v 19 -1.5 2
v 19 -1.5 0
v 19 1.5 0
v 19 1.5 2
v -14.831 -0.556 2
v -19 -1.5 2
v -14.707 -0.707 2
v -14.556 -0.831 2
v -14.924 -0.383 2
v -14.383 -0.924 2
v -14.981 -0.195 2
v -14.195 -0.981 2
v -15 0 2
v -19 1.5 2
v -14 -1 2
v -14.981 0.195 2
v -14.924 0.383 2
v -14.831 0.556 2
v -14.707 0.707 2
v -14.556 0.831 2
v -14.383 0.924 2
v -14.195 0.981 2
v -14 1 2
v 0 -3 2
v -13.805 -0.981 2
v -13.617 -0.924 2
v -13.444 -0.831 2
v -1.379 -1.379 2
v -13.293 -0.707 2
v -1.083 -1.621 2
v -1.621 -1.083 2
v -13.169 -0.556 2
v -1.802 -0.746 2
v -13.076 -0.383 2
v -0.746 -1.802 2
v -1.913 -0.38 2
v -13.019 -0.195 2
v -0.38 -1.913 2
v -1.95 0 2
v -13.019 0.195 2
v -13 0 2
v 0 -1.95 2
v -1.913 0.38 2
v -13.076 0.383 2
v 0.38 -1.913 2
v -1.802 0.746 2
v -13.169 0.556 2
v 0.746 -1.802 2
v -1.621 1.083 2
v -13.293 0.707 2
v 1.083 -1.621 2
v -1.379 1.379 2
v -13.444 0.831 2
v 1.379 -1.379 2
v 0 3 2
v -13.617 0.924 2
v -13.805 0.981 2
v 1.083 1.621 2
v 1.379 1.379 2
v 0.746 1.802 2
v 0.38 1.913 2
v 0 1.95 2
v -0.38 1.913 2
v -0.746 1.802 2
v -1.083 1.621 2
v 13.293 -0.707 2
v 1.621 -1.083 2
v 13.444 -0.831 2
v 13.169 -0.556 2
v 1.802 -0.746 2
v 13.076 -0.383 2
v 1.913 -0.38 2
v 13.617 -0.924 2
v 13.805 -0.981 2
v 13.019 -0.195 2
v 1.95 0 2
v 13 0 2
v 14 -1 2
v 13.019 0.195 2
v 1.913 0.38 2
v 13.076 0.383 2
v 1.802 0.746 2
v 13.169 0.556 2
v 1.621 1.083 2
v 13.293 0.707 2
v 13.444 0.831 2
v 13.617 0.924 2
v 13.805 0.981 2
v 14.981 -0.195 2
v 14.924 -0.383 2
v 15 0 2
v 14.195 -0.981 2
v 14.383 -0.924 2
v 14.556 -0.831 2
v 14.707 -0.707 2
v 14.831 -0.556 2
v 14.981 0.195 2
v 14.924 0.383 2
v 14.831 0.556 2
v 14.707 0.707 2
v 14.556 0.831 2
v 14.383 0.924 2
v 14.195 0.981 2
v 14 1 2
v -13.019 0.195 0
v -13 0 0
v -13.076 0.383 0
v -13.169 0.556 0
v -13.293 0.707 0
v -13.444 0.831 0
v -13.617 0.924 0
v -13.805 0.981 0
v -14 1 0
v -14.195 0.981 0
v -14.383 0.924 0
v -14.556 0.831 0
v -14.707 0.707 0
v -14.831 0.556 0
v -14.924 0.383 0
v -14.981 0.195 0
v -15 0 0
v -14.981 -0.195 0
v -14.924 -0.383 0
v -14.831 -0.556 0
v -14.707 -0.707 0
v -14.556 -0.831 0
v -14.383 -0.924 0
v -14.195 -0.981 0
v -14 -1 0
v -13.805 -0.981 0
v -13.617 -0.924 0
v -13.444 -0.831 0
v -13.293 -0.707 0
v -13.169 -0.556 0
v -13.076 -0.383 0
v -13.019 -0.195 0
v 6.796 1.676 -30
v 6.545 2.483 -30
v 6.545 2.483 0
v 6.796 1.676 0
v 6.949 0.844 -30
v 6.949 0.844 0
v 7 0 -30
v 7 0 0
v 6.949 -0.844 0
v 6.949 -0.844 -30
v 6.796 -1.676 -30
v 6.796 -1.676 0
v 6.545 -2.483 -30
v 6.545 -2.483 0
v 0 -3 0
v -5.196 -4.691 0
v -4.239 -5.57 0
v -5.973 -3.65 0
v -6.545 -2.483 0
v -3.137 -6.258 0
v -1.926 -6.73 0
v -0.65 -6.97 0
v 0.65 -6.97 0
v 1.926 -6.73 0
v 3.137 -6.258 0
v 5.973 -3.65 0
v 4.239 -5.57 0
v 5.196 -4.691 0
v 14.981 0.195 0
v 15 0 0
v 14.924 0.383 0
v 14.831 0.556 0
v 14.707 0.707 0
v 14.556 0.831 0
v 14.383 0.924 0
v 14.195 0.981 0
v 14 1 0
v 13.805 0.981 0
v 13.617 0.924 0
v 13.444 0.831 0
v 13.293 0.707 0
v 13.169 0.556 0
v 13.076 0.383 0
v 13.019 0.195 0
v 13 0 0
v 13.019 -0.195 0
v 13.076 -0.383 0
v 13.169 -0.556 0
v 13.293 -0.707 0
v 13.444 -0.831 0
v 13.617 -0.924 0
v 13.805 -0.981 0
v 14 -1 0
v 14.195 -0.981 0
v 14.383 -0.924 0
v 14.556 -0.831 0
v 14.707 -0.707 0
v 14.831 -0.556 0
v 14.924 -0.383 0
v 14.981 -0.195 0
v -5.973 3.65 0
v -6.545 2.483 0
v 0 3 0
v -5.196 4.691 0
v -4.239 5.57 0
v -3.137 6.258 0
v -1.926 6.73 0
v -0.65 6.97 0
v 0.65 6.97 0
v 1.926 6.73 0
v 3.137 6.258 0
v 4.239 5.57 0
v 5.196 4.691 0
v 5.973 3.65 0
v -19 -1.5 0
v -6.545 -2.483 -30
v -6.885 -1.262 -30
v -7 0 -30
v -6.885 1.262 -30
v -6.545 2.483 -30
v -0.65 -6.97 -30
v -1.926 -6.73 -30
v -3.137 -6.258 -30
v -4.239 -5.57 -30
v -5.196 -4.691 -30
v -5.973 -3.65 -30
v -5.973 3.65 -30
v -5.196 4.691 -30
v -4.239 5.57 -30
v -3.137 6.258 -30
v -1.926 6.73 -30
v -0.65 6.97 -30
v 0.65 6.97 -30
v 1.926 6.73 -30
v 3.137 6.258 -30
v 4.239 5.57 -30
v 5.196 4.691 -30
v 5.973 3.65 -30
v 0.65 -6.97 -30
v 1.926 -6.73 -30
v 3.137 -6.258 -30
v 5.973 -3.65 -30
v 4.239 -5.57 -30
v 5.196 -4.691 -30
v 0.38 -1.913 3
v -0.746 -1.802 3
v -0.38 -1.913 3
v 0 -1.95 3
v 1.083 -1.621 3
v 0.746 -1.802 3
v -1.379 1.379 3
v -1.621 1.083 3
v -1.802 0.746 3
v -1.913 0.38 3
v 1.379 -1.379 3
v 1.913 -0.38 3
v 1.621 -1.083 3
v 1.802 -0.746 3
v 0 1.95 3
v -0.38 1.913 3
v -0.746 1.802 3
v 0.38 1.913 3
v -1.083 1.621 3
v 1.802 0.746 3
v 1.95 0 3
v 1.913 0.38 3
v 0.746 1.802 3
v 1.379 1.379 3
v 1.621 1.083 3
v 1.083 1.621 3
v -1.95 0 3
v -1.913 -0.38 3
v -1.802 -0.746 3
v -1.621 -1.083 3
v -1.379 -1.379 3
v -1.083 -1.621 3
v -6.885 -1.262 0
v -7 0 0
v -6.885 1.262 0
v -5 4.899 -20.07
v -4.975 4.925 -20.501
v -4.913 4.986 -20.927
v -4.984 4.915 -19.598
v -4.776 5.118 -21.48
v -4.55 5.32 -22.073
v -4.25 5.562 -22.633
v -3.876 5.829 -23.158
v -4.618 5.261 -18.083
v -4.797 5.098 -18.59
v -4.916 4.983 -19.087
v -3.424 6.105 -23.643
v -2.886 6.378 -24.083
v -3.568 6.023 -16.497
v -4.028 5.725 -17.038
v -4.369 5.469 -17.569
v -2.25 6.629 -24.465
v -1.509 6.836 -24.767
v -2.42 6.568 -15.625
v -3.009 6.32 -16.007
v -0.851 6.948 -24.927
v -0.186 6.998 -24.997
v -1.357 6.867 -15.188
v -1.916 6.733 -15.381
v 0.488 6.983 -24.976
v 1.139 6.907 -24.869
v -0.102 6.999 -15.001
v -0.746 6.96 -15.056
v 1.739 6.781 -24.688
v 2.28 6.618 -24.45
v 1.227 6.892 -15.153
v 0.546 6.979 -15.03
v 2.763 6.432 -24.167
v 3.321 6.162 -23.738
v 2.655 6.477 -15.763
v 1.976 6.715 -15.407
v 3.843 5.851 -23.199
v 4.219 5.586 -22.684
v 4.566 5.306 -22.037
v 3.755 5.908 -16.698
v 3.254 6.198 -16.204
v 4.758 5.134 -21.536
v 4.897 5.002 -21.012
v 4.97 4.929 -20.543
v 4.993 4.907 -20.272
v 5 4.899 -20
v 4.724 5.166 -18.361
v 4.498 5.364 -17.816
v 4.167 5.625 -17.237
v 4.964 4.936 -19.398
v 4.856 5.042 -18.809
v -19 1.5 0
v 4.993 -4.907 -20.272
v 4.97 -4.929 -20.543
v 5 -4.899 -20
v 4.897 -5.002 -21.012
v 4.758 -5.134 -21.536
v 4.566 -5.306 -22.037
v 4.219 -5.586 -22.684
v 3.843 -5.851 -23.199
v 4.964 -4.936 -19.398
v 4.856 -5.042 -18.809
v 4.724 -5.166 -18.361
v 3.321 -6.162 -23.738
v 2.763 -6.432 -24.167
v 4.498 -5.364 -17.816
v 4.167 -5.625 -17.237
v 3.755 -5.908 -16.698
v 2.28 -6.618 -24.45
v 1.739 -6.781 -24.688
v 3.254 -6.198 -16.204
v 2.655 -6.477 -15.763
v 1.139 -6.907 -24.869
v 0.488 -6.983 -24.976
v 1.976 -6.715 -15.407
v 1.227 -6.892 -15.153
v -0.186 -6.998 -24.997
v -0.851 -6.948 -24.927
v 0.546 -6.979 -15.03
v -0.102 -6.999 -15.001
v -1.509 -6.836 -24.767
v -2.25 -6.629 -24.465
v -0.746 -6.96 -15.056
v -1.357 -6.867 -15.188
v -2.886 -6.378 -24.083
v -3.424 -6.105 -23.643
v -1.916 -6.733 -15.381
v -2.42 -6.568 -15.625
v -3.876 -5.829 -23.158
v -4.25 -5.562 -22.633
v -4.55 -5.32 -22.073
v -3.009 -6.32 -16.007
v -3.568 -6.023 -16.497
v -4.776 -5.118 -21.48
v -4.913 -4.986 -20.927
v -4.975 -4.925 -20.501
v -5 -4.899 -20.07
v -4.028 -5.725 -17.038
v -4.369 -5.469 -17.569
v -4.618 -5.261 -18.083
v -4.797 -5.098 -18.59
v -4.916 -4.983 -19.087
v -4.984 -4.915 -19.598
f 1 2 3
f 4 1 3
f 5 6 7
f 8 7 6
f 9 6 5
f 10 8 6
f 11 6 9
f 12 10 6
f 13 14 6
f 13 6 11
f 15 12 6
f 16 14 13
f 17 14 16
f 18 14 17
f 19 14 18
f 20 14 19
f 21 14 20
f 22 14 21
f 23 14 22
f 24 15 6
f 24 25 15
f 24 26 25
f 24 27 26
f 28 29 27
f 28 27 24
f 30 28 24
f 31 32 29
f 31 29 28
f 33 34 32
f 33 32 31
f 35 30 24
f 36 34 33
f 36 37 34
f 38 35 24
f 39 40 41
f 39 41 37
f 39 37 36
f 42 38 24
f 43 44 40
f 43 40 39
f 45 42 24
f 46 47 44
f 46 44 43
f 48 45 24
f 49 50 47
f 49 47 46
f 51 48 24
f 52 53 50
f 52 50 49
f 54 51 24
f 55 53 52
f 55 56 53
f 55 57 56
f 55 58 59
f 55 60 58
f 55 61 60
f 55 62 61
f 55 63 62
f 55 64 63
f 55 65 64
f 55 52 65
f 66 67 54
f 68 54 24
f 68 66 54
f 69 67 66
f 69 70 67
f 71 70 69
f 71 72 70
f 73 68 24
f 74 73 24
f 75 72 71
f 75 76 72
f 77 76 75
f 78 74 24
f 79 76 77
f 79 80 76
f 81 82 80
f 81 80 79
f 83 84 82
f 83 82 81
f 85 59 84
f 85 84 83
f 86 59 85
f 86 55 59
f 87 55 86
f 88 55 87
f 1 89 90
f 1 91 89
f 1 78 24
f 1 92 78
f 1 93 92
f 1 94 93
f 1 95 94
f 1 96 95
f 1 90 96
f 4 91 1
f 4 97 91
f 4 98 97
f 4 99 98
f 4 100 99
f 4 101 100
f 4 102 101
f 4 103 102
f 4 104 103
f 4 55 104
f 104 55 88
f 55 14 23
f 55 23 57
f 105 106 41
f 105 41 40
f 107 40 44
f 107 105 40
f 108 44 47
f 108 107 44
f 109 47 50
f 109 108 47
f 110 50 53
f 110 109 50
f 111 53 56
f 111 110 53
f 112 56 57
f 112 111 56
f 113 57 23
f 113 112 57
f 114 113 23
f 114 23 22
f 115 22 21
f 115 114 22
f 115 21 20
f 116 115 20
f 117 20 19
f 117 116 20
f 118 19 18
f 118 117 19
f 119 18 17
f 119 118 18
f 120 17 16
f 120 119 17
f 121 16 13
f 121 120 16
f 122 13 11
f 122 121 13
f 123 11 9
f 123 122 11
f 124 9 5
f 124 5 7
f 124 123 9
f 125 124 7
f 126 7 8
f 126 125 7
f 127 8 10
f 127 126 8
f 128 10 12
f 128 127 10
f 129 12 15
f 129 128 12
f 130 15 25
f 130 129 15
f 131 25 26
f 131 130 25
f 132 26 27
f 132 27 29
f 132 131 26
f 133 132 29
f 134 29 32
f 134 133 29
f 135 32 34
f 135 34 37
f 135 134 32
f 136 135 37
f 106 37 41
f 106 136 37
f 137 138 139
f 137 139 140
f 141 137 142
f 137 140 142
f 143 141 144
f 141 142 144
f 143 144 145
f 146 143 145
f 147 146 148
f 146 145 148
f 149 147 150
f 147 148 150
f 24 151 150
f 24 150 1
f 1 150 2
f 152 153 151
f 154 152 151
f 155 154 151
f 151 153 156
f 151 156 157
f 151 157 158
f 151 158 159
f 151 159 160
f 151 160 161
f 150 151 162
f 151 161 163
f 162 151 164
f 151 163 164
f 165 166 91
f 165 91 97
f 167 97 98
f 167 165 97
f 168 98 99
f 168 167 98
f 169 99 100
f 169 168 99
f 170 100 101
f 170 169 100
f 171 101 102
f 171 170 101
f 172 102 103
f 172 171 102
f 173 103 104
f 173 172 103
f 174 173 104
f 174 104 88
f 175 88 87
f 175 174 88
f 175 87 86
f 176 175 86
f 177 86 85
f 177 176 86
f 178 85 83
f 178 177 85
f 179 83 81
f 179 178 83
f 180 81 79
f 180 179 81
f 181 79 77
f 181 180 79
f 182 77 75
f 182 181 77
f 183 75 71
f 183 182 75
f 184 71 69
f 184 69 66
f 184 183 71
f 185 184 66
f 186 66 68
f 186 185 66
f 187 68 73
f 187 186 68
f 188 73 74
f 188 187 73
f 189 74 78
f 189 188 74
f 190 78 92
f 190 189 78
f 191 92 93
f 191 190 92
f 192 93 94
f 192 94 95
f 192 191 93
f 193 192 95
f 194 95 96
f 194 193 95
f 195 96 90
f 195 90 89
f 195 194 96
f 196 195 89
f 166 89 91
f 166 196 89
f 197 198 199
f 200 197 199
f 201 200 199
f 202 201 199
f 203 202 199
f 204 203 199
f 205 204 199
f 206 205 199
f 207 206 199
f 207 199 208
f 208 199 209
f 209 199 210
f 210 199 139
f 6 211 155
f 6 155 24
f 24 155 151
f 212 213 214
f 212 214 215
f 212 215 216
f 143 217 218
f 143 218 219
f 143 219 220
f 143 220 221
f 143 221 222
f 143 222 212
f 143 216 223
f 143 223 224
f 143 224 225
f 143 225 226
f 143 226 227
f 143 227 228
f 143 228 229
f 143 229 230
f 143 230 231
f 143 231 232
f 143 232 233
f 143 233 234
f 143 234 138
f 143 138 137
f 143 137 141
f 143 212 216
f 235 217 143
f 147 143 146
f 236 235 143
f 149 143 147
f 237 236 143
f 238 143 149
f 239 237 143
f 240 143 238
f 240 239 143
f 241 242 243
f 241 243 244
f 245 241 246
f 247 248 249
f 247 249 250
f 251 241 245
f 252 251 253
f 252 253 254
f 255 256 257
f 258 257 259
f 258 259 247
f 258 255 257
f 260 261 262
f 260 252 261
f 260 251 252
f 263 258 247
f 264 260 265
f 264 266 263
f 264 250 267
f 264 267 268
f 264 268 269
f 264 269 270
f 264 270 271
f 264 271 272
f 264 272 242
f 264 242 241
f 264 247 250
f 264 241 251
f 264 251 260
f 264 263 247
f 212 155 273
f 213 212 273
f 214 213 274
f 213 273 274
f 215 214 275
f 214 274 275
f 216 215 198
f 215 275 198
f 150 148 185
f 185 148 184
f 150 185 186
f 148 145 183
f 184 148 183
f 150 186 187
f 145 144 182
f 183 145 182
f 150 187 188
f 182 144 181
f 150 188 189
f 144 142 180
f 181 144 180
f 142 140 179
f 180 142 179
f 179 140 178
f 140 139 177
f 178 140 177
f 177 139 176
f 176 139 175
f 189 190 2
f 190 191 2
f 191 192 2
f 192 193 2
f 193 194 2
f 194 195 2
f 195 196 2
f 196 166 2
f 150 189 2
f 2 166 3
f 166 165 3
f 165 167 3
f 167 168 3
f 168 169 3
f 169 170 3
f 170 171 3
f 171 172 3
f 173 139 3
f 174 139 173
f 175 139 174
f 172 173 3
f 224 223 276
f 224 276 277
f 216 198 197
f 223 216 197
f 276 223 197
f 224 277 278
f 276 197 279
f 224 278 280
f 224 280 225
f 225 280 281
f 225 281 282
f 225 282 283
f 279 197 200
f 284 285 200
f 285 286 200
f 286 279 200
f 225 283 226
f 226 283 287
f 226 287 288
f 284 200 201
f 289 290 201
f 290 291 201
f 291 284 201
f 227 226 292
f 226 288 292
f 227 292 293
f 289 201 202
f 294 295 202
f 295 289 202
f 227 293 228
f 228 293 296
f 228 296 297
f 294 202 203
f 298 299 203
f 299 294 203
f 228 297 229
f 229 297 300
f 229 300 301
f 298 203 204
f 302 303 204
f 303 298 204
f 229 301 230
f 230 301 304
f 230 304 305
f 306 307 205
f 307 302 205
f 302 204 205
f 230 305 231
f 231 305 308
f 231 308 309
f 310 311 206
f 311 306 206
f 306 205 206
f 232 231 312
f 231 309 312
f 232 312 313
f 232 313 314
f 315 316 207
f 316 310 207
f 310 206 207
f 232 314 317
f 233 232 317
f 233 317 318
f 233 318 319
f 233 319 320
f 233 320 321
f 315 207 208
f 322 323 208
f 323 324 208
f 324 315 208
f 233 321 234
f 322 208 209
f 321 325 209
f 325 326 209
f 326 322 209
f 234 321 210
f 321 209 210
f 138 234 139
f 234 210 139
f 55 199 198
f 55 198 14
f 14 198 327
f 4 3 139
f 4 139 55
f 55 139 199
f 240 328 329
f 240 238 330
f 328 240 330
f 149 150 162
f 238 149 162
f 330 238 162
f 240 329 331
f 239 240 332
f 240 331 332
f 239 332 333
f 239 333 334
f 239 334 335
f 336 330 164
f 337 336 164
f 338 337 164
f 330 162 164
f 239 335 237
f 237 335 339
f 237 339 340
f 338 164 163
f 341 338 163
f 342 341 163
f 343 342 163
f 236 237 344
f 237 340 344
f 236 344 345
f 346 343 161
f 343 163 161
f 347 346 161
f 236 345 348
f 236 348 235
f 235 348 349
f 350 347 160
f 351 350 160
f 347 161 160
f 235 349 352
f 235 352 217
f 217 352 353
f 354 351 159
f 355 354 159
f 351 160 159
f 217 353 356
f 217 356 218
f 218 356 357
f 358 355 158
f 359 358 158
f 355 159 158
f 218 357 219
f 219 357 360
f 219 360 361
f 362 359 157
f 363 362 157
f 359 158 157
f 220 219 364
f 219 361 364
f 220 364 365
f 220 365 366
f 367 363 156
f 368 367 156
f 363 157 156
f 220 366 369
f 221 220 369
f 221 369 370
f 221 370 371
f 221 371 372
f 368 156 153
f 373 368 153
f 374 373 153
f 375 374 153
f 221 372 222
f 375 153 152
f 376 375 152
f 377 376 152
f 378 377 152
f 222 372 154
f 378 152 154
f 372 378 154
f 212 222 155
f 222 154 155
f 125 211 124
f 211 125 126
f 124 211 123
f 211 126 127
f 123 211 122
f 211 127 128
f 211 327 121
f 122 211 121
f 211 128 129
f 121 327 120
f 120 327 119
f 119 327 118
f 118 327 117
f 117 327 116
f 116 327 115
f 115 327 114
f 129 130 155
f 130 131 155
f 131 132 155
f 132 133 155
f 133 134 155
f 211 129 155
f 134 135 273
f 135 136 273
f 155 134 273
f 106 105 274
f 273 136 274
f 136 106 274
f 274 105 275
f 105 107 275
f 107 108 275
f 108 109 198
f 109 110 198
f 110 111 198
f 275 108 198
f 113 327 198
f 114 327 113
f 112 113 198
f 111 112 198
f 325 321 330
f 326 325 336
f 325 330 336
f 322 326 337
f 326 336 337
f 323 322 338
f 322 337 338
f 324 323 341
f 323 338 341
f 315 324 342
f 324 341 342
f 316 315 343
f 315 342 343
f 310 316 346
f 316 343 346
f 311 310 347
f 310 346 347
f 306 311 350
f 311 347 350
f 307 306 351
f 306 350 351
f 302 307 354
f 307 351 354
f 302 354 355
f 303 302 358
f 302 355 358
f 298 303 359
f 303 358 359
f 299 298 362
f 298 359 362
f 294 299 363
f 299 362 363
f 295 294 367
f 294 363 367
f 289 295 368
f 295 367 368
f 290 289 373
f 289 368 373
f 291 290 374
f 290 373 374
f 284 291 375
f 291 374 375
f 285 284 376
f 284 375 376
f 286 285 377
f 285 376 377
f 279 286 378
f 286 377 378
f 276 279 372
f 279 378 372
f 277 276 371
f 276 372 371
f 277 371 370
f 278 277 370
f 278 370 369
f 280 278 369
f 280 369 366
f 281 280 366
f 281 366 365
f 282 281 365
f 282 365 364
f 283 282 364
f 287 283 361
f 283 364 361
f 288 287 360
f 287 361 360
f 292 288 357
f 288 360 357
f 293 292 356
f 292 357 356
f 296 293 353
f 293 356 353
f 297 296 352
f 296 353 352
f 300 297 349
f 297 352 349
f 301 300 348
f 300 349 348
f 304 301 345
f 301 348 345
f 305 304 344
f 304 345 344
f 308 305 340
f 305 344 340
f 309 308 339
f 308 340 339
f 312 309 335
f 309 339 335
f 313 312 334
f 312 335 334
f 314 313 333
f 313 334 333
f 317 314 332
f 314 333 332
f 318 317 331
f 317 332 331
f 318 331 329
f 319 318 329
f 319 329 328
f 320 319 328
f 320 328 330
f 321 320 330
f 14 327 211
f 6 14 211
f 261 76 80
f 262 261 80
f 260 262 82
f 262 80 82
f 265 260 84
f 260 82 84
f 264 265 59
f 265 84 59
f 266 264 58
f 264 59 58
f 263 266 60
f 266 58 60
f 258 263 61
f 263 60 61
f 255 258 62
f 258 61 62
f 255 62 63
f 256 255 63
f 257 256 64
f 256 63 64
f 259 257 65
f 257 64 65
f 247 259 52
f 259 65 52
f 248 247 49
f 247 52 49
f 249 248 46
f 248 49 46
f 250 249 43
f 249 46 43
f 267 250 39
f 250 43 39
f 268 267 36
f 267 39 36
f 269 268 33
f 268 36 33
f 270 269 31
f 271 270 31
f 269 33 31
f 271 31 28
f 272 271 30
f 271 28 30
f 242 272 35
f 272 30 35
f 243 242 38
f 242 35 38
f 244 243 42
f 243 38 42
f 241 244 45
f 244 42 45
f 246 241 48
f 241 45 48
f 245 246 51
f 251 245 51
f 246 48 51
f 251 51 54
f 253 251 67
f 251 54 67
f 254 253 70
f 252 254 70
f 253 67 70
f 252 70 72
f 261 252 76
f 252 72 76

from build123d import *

# Parameters (mm, degrees)
F0_R     = 1
F1_DEPTH = 2
F2_R     = 1.95
F3_DEPTH = 1
F5_DEPTH = 30
F6_R     = 5
F7_DEPTH = 12.5


# Not quite as in the source:
# - ends of sketch curves that miss each other by under 0.0002 mm in the source are joined


with BuildPart() as f1:
    # F0 (on Top) → F1 (new body)
    with BuildSketch(Plane.XY):
        Polygon((0, -3), (0, 0), (0, 3), (-19, 1.5), (-19, 0), (-19, -1.5), align=None)
        with Locations((-14, 0)):
            Circle(F0_R, mode=Mode.SUBTRACT)
        Polygon((0, 3), (0, 0), (0, -3), (18.9999993891, -1.5), (18.9999993891, 0), (18.9999993891, 1.5), align=None)
        with Locations((14, 0)):
            Circle(F0_R, mode=Mode.SUBTRACT)
    extrude(amount=F1_DEPTH)

    # F2 (on face) → F3 (join)
    with BuildSketch(Plane.XY.offset(2)):
        Circle(F2_R)
    extrude(amount=F3_DEPTH)

    # F4 (on face) → F5 (join)
    with BuildSketch(Plane(origin=(0, 0, 0), x_dir=(1, 0, 0), z_dir=(0, 0, -1))):
        with BuildLine():
            Line((0, 3), (6.5447045484, 2.4833127822))
            ThreePointArc((6.5447045484, 2.4833127822), (9.2e-09, 7), (-6.5447045419, 2.4833127993))
            Line((-6.5447045419, 2.4833127993), (0, 3))
        make_face()
        with BuildLine():
            ThreePointArc((6.5447045484, -2.4833127822), (6.8852353569, -1.2623525976), (7, 0))
            ThreePointArc((7, 0), (6.8852353569, 1.2623525976), (6.5447045484, 2.4833127822))
            Line((6.5447045484, 2.4833127822), (0, 3))
            Line((0, 3), (-6.5447045419, 2.4833127993))
            ThreePointArc((-6.5447045419, 2.4833127993), (-7, 0), (-6.5447045419, -2.4833127993))
            Line((-6.5447045419, -2.4833127993), (0, -3))
            Line((0, -3), (6.5447045484, -2.4833127822))
        make_face()
        with BuildLine():
            ThreePointArc((-6.5447045419, -2.4833127993), (9.2e-09, -7), (6.5447045484, -2.4833127822))
            Line((6.5447045484, -2.4833127822), (0, -3))
            Line((0, -3), (-6.5447045419, -2.4833127993))
        make_face()
    extrude(amount=F5_DEPTH)

    # F6 (on Front) → F7 (cut, symmetric)
    with BuildSketch(Plane.XZ):
        with Locations((0, -20)):
            Circle(F6_R)
    extrude(amount=F7_DEPTH, both=True, mode=Mode.SUBTRACT)


solid = f1.part
